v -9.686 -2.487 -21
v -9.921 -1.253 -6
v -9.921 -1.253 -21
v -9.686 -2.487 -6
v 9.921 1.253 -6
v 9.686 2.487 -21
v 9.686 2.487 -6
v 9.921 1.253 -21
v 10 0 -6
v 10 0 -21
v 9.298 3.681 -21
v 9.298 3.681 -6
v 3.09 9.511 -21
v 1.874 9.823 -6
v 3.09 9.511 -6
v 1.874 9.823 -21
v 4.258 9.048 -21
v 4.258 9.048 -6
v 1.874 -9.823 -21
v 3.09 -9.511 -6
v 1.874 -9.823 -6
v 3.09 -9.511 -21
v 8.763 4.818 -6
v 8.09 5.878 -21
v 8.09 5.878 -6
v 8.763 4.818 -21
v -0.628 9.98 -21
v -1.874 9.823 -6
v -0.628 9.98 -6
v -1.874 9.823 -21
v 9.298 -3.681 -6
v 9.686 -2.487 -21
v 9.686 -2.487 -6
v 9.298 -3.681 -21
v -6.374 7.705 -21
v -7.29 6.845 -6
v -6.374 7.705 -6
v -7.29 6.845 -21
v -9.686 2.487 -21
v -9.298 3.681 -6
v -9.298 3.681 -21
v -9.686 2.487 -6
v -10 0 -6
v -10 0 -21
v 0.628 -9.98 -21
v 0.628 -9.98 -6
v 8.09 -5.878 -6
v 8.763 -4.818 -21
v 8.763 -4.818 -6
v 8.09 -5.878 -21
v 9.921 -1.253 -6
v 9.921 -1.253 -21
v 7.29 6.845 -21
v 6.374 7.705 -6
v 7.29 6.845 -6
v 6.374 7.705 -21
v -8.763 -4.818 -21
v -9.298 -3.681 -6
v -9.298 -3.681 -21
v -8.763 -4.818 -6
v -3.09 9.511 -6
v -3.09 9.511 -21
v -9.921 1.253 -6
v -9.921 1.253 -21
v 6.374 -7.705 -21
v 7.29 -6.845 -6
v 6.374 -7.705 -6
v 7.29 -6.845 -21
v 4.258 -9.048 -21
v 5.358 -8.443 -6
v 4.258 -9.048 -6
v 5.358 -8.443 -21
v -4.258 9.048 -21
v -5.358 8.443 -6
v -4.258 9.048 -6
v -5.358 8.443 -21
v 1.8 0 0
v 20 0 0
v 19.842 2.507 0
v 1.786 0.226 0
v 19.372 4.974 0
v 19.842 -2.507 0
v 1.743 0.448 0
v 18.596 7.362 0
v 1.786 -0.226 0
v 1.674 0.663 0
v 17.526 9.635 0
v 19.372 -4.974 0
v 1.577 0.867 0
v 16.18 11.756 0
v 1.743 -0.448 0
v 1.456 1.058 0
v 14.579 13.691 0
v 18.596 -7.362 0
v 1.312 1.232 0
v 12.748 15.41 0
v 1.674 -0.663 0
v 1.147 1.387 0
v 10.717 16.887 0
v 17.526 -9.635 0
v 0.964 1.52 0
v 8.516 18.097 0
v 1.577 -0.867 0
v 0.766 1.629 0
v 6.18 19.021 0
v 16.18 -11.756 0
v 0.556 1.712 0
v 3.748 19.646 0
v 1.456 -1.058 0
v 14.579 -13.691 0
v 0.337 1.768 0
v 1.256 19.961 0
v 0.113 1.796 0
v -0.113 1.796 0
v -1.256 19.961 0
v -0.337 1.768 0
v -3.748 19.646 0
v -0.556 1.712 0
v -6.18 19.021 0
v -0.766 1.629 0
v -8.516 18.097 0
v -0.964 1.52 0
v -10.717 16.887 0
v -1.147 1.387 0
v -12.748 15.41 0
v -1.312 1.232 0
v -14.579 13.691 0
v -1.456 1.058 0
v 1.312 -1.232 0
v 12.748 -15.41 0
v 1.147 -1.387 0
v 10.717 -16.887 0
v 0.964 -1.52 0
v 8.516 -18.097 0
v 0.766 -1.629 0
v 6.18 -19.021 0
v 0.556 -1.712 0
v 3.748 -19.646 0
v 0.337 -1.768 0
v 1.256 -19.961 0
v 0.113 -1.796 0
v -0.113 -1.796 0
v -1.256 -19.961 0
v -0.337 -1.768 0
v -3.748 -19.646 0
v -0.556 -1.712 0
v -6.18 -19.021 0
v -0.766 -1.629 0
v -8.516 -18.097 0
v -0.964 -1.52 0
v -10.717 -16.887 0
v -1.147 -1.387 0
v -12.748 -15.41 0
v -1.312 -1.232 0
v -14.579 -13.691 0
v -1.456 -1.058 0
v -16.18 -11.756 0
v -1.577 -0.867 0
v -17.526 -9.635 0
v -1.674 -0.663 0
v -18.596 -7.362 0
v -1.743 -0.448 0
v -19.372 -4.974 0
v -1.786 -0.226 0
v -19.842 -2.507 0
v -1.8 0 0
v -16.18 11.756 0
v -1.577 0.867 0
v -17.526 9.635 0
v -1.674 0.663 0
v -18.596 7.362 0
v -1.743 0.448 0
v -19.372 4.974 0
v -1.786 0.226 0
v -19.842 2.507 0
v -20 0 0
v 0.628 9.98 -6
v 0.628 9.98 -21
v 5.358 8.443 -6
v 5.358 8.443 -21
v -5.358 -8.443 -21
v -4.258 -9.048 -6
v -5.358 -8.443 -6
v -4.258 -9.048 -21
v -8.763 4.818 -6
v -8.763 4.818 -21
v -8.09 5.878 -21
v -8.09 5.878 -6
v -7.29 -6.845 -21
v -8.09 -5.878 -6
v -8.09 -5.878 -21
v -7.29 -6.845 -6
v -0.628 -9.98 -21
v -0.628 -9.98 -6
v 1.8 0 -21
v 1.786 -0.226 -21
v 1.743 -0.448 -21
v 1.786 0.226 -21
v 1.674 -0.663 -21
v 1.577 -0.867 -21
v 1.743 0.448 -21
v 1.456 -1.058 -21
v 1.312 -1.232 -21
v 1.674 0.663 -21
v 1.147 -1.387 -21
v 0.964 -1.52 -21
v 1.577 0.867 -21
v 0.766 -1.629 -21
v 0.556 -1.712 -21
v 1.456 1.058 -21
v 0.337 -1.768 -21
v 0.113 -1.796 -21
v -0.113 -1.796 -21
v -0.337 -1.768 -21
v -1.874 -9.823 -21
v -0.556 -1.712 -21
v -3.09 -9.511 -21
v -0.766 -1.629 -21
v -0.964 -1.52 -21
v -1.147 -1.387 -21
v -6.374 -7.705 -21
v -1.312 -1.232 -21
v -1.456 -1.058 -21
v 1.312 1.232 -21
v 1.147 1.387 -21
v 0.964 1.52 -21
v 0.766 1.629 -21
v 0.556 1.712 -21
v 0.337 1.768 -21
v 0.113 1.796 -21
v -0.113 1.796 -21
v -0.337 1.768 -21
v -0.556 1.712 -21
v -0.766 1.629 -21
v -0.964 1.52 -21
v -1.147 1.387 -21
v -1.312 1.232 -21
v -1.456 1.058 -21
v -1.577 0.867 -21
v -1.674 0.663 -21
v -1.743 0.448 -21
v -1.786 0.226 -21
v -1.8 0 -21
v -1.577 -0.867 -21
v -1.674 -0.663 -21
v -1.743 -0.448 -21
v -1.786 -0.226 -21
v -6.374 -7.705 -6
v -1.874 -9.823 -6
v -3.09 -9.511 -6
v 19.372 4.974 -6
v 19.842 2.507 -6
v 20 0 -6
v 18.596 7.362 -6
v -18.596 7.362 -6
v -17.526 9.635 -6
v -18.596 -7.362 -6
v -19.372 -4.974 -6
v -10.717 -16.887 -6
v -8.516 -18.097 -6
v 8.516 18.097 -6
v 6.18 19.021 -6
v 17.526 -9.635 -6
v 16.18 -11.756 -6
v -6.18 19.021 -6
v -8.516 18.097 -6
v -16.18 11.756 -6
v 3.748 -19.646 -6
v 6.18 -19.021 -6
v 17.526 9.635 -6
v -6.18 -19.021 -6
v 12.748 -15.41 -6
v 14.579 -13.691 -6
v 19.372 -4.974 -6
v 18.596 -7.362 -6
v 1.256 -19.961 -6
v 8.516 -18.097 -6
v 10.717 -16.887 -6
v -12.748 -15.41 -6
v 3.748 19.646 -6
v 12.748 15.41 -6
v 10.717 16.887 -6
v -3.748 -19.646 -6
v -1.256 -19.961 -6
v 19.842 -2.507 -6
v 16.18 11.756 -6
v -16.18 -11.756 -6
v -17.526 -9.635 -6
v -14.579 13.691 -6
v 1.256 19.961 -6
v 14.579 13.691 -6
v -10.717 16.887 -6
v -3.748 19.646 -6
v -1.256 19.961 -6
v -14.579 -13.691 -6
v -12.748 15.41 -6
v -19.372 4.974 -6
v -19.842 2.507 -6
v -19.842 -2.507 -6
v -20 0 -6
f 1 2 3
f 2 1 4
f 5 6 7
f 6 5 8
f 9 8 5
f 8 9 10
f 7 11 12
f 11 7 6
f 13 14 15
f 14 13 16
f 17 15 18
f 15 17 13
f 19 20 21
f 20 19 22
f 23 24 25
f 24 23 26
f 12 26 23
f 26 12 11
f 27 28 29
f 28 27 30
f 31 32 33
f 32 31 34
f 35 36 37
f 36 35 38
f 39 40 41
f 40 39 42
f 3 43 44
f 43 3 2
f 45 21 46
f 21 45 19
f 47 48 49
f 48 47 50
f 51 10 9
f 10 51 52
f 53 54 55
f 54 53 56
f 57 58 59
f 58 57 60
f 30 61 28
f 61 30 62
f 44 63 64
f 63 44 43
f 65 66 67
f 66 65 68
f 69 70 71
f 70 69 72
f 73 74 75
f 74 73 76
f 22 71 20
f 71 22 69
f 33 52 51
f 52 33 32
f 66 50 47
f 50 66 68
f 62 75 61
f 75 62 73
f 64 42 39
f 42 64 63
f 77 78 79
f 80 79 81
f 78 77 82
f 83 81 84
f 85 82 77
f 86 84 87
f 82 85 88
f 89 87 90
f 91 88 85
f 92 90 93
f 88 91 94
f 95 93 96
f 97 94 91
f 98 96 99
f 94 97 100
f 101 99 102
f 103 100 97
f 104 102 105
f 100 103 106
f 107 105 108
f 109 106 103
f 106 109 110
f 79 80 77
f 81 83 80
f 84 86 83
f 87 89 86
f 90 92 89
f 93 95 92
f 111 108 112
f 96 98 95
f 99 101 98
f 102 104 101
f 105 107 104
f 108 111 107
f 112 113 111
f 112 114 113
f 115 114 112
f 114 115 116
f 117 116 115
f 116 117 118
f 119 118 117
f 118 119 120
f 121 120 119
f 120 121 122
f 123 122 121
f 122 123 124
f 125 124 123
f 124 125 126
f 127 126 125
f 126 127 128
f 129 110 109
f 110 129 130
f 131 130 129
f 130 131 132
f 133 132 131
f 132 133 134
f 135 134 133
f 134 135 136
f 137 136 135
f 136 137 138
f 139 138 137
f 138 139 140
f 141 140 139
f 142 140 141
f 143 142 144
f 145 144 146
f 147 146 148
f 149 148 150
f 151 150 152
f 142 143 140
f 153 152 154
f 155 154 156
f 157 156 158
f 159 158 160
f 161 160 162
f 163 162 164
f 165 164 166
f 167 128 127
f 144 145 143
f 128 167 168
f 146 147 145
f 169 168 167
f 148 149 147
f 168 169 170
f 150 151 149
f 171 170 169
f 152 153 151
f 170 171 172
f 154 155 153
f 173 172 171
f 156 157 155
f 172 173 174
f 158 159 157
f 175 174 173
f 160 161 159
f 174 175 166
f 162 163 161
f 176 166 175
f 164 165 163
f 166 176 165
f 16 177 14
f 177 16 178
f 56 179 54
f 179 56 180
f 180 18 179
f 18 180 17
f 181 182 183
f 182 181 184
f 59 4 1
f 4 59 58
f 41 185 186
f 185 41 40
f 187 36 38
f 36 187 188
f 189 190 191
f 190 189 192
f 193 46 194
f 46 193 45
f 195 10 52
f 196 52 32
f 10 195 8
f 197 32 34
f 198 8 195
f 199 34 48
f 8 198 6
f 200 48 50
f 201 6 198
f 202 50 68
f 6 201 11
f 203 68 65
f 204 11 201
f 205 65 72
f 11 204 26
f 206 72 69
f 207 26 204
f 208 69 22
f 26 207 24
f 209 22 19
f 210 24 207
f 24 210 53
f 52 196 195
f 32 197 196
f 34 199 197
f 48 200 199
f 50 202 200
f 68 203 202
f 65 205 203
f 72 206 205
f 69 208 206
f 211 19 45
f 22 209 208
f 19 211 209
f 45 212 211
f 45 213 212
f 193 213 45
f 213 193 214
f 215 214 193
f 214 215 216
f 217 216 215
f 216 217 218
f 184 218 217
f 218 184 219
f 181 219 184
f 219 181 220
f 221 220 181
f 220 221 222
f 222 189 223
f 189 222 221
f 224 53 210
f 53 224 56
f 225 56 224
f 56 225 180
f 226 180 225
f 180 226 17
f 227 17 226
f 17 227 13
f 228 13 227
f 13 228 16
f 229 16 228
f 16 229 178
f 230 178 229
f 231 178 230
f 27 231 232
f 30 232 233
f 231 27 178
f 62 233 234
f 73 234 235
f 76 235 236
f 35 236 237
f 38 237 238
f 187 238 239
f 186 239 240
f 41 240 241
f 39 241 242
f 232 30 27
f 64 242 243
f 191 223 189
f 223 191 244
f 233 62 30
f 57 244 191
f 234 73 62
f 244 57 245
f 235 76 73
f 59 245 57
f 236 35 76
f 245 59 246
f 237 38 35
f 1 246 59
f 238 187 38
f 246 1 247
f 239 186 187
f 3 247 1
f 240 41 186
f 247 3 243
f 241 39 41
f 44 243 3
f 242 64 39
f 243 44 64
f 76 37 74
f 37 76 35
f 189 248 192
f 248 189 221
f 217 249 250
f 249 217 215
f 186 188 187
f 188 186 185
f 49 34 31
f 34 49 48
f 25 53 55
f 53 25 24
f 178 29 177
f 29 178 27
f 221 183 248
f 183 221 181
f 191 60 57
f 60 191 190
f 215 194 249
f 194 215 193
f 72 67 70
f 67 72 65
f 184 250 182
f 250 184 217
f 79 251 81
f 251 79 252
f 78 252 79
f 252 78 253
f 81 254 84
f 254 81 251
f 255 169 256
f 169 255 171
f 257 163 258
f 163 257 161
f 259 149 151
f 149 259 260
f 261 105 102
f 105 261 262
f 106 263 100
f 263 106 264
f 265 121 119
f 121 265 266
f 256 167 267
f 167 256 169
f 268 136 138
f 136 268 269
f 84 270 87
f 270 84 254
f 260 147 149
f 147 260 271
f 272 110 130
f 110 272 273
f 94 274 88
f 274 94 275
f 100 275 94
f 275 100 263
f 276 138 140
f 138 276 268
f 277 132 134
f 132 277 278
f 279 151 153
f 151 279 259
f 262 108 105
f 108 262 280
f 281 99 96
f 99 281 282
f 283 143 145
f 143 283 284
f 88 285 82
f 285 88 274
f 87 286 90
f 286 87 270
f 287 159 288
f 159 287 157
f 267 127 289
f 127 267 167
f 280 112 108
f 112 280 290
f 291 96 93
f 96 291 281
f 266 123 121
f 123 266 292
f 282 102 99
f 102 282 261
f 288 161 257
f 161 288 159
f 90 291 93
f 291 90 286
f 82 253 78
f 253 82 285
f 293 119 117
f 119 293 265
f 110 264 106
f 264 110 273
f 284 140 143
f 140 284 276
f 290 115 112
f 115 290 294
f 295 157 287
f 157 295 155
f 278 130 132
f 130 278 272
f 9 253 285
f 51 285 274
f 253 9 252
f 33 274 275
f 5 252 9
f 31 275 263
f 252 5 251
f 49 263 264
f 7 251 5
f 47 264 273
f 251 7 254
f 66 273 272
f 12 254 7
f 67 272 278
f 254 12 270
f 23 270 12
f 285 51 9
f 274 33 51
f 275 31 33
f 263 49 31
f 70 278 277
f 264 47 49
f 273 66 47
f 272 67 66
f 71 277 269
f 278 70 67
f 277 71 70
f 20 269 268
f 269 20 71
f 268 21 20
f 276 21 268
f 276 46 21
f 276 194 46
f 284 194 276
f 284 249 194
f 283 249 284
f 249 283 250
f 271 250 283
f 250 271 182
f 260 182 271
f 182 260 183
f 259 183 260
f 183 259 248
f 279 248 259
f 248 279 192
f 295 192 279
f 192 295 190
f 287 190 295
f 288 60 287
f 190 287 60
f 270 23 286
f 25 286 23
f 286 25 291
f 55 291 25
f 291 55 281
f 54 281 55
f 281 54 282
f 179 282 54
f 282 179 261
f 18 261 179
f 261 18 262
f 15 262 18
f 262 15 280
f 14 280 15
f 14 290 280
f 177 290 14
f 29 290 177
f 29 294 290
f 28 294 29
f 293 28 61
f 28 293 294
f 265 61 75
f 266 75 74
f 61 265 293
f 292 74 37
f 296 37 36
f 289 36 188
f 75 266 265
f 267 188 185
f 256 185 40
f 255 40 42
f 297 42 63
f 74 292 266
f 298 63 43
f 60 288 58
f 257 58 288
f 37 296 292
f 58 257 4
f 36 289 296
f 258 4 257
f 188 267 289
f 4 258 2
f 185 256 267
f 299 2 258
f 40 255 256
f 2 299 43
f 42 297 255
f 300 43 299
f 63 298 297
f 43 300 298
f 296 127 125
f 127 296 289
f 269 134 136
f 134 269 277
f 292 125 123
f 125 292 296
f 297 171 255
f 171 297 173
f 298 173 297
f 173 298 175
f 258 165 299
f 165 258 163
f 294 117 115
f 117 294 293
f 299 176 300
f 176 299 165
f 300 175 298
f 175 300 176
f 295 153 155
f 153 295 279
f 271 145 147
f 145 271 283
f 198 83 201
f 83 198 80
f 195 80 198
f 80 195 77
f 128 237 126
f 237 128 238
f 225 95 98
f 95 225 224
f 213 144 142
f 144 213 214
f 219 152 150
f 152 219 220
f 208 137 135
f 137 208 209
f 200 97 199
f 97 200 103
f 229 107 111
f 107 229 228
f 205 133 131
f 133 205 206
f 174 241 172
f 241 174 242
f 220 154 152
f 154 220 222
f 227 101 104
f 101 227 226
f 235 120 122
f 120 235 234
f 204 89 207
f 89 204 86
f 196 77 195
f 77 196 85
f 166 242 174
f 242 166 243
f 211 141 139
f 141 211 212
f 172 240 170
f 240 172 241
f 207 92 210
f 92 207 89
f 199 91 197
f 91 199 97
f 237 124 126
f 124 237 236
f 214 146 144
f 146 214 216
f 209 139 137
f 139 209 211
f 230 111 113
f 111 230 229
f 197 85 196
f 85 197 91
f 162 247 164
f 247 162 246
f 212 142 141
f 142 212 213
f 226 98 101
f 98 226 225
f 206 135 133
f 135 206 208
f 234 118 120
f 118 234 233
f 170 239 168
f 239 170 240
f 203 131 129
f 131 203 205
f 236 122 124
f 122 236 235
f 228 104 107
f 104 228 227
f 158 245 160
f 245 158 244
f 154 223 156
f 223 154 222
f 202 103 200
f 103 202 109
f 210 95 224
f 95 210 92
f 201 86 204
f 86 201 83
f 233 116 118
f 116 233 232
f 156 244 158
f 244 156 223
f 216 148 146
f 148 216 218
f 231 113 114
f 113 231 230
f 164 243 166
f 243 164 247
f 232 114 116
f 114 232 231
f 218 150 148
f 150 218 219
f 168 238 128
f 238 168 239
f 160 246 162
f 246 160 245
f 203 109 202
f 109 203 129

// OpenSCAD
$fn = 50;


difference() {
	union() {
		translate(v = [0, 0, -21.0000000000]) {
			cylinder(h = 21, r = 10.0000000000);
		}
		translate(v = [0, 0, -6.0000000000]) {
			cylinder(h = 6, r = 20.0000000000);
		}
	}
	union() {
		#translate(v = [0, 0, -21]) {
			cylinder(h = 21, r = 1.8000000000);
		}
	}
}
